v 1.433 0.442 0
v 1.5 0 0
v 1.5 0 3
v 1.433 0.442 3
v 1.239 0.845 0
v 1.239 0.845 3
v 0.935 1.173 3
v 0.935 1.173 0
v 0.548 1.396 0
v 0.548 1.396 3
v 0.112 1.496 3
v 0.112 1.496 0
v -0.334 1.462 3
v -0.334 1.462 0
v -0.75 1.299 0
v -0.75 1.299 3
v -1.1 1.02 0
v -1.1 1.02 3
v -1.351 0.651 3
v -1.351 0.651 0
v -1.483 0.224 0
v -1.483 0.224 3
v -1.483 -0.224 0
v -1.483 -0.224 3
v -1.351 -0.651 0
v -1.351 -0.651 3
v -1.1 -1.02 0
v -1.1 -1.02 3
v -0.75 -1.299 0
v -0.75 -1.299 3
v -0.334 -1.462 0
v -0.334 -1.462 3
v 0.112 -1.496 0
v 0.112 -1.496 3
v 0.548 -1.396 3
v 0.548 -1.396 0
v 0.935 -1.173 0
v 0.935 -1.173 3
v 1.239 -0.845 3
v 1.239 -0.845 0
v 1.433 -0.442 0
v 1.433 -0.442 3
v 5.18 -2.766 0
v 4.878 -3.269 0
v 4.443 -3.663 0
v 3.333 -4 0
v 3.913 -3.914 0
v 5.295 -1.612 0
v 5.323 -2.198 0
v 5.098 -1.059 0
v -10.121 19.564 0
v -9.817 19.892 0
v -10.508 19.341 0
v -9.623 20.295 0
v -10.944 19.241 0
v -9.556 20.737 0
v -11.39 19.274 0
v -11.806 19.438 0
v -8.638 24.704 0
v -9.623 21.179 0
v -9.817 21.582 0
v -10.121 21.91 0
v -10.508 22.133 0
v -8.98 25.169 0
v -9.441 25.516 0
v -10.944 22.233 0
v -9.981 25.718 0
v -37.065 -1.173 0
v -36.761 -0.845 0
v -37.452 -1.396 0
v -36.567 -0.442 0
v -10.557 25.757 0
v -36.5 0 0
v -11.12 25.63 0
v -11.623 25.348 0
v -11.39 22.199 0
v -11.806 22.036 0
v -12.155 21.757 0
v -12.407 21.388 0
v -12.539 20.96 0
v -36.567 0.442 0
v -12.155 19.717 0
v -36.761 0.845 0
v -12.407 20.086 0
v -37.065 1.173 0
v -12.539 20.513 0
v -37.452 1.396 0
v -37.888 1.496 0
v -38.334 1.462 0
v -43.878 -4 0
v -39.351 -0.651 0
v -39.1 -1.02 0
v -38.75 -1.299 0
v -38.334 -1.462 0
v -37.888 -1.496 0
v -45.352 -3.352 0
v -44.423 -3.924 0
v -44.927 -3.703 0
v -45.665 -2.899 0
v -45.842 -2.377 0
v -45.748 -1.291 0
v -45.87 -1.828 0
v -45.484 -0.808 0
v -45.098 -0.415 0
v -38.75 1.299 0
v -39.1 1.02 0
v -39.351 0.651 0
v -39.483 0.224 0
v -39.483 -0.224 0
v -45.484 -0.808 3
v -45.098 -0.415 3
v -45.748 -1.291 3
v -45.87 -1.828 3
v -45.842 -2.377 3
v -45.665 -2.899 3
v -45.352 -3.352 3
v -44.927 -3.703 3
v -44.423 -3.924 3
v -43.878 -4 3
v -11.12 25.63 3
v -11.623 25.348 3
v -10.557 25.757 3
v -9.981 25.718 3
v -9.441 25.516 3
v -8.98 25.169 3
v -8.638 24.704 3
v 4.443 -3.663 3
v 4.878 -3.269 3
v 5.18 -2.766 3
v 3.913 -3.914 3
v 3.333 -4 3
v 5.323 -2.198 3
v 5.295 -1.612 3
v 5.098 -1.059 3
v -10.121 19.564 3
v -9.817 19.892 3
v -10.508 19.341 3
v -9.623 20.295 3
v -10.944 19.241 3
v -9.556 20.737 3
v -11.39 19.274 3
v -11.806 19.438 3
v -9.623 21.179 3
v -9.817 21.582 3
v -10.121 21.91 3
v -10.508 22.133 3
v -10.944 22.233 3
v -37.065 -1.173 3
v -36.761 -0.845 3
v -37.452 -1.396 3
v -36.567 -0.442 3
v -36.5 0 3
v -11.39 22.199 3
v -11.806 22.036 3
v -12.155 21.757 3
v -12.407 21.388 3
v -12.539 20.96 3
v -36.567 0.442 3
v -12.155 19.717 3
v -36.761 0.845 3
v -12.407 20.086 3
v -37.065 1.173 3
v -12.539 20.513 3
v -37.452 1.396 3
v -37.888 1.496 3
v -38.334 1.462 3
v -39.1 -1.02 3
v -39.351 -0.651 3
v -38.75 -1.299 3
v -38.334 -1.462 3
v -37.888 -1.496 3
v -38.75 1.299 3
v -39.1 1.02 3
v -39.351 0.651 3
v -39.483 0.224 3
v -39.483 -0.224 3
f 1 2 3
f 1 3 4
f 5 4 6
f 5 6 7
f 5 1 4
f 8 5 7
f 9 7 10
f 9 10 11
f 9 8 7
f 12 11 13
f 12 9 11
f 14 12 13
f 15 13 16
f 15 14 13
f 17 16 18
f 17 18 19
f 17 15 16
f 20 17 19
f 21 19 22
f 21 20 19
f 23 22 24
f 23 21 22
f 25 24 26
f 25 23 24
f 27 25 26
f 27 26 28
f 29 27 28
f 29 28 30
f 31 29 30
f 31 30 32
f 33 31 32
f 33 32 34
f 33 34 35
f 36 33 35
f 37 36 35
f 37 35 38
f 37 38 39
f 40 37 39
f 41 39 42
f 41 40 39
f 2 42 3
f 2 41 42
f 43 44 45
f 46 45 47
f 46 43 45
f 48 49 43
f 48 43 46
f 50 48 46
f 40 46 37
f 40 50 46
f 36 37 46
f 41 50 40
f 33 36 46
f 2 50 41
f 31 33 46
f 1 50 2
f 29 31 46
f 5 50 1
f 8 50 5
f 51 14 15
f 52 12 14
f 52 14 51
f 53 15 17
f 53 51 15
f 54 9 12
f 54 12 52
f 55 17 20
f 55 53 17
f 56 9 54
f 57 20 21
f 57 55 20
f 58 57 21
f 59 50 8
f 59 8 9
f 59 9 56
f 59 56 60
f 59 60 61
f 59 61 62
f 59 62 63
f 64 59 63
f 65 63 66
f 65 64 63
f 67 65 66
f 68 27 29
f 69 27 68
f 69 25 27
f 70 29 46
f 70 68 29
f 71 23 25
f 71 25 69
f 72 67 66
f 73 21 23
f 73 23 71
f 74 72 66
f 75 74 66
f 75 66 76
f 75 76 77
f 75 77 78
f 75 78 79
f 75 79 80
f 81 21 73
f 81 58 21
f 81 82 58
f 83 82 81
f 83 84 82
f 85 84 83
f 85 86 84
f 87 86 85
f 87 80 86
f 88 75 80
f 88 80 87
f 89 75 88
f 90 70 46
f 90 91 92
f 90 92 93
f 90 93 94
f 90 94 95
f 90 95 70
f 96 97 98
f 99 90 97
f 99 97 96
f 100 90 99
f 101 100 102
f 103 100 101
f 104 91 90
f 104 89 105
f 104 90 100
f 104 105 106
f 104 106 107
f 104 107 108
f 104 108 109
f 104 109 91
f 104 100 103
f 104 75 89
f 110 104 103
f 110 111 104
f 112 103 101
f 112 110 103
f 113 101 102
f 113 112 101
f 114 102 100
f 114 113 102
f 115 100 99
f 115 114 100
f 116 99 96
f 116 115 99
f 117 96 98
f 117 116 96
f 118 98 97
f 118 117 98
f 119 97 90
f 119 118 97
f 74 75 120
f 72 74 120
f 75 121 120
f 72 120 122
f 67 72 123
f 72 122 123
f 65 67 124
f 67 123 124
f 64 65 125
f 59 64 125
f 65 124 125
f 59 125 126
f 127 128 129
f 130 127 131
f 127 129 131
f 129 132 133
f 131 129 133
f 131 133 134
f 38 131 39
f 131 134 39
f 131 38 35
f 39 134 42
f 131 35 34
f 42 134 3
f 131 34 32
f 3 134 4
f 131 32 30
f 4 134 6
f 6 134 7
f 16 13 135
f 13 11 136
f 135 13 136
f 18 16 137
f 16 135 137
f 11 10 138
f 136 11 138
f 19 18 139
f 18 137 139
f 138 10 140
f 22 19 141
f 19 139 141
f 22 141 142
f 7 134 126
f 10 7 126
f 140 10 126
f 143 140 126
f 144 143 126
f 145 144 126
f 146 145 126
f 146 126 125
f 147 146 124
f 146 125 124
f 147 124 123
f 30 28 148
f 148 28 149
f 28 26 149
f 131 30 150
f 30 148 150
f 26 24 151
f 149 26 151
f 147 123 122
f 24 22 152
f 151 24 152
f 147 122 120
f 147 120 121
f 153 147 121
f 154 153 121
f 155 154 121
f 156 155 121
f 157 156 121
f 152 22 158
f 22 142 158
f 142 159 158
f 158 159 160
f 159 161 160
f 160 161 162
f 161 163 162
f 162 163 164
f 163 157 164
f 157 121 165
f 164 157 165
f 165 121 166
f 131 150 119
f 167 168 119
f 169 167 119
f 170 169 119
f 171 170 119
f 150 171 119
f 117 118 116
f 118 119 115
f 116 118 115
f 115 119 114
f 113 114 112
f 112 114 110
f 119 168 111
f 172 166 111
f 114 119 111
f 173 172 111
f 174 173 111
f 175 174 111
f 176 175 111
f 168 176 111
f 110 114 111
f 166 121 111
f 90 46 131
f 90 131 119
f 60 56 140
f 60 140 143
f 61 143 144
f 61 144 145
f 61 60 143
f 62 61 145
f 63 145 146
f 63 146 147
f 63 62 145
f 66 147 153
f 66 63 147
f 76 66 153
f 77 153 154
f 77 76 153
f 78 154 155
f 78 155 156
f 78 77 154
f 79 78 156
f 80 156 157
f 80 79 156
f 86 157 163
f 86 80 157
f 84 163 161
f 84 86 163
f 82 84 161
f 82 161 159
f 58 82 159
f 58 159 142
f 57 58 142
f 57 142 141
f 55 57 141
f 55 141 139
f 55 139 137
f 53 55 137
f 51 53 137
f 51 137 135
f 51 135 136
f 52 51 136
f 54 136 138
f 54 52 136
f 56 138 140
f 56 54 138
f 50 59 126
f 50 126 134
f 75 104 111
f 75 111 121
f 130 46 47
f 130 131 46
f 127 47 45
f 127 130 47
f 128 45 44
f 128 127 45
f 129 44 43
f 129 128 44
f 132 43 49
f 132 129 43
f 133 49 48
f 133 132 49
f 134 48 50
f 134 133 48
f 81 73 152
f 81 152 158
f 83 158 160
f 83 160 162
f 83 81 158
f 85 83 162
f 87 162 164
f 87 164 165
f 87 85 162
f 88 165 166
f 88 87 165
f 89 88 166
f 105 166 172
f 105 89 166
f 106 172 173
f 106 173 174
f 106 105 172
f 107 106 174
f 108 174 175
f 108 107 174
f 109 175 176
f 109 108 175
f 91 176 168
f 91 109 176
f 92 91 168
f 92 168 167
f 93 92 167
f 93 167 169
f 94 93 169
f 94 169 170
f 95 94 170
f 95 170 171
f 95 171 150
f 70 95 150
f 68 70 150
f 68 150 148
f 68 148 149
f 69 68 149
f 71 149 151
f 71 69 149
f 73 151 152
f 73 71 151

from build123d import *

# Parameters (mm, degrees)
ESQUISSE1_R        = 1.5
BOSS_EXTRU_1_DEPTH = 3
CONG_2_R           = 2


with BuildPart() as part:
    # Esquisse1 → Boss.-Extru.1 (new body)
    with BuildSketch(Plane.XY):
        Polygon((-49.755710808, -4), (-9.749908145, 26.789473423), (6.665609221, -4), align=None)
        with Locations((-11.055921053, 20.736841844)):
            Circle(ESQUISSE1_R, mode=Mode.SUBTRACT)
        with Locations((-38, 0)):
            Circle(ESQUISSE1_R, mode=Mode.SUBTRACT)
        Circle(ESQUISSE1_R, mode=Mode.SUBTRACT)
    extrude(amount=BOSS_EXTRU_1_DEPTH)

    # Congé2
    cong_2_edges = [part.edges().sort_by_distance(p)[0] for p in [
        (-49.755710808, -4, 1.5),
        (-9.749908145, 26.789473423, 1.5),
        (6.665609221, -4, 1.5),
    ]]
    fillet(cong_2_edges, radius=CONG_2_R)


solid = part.part
